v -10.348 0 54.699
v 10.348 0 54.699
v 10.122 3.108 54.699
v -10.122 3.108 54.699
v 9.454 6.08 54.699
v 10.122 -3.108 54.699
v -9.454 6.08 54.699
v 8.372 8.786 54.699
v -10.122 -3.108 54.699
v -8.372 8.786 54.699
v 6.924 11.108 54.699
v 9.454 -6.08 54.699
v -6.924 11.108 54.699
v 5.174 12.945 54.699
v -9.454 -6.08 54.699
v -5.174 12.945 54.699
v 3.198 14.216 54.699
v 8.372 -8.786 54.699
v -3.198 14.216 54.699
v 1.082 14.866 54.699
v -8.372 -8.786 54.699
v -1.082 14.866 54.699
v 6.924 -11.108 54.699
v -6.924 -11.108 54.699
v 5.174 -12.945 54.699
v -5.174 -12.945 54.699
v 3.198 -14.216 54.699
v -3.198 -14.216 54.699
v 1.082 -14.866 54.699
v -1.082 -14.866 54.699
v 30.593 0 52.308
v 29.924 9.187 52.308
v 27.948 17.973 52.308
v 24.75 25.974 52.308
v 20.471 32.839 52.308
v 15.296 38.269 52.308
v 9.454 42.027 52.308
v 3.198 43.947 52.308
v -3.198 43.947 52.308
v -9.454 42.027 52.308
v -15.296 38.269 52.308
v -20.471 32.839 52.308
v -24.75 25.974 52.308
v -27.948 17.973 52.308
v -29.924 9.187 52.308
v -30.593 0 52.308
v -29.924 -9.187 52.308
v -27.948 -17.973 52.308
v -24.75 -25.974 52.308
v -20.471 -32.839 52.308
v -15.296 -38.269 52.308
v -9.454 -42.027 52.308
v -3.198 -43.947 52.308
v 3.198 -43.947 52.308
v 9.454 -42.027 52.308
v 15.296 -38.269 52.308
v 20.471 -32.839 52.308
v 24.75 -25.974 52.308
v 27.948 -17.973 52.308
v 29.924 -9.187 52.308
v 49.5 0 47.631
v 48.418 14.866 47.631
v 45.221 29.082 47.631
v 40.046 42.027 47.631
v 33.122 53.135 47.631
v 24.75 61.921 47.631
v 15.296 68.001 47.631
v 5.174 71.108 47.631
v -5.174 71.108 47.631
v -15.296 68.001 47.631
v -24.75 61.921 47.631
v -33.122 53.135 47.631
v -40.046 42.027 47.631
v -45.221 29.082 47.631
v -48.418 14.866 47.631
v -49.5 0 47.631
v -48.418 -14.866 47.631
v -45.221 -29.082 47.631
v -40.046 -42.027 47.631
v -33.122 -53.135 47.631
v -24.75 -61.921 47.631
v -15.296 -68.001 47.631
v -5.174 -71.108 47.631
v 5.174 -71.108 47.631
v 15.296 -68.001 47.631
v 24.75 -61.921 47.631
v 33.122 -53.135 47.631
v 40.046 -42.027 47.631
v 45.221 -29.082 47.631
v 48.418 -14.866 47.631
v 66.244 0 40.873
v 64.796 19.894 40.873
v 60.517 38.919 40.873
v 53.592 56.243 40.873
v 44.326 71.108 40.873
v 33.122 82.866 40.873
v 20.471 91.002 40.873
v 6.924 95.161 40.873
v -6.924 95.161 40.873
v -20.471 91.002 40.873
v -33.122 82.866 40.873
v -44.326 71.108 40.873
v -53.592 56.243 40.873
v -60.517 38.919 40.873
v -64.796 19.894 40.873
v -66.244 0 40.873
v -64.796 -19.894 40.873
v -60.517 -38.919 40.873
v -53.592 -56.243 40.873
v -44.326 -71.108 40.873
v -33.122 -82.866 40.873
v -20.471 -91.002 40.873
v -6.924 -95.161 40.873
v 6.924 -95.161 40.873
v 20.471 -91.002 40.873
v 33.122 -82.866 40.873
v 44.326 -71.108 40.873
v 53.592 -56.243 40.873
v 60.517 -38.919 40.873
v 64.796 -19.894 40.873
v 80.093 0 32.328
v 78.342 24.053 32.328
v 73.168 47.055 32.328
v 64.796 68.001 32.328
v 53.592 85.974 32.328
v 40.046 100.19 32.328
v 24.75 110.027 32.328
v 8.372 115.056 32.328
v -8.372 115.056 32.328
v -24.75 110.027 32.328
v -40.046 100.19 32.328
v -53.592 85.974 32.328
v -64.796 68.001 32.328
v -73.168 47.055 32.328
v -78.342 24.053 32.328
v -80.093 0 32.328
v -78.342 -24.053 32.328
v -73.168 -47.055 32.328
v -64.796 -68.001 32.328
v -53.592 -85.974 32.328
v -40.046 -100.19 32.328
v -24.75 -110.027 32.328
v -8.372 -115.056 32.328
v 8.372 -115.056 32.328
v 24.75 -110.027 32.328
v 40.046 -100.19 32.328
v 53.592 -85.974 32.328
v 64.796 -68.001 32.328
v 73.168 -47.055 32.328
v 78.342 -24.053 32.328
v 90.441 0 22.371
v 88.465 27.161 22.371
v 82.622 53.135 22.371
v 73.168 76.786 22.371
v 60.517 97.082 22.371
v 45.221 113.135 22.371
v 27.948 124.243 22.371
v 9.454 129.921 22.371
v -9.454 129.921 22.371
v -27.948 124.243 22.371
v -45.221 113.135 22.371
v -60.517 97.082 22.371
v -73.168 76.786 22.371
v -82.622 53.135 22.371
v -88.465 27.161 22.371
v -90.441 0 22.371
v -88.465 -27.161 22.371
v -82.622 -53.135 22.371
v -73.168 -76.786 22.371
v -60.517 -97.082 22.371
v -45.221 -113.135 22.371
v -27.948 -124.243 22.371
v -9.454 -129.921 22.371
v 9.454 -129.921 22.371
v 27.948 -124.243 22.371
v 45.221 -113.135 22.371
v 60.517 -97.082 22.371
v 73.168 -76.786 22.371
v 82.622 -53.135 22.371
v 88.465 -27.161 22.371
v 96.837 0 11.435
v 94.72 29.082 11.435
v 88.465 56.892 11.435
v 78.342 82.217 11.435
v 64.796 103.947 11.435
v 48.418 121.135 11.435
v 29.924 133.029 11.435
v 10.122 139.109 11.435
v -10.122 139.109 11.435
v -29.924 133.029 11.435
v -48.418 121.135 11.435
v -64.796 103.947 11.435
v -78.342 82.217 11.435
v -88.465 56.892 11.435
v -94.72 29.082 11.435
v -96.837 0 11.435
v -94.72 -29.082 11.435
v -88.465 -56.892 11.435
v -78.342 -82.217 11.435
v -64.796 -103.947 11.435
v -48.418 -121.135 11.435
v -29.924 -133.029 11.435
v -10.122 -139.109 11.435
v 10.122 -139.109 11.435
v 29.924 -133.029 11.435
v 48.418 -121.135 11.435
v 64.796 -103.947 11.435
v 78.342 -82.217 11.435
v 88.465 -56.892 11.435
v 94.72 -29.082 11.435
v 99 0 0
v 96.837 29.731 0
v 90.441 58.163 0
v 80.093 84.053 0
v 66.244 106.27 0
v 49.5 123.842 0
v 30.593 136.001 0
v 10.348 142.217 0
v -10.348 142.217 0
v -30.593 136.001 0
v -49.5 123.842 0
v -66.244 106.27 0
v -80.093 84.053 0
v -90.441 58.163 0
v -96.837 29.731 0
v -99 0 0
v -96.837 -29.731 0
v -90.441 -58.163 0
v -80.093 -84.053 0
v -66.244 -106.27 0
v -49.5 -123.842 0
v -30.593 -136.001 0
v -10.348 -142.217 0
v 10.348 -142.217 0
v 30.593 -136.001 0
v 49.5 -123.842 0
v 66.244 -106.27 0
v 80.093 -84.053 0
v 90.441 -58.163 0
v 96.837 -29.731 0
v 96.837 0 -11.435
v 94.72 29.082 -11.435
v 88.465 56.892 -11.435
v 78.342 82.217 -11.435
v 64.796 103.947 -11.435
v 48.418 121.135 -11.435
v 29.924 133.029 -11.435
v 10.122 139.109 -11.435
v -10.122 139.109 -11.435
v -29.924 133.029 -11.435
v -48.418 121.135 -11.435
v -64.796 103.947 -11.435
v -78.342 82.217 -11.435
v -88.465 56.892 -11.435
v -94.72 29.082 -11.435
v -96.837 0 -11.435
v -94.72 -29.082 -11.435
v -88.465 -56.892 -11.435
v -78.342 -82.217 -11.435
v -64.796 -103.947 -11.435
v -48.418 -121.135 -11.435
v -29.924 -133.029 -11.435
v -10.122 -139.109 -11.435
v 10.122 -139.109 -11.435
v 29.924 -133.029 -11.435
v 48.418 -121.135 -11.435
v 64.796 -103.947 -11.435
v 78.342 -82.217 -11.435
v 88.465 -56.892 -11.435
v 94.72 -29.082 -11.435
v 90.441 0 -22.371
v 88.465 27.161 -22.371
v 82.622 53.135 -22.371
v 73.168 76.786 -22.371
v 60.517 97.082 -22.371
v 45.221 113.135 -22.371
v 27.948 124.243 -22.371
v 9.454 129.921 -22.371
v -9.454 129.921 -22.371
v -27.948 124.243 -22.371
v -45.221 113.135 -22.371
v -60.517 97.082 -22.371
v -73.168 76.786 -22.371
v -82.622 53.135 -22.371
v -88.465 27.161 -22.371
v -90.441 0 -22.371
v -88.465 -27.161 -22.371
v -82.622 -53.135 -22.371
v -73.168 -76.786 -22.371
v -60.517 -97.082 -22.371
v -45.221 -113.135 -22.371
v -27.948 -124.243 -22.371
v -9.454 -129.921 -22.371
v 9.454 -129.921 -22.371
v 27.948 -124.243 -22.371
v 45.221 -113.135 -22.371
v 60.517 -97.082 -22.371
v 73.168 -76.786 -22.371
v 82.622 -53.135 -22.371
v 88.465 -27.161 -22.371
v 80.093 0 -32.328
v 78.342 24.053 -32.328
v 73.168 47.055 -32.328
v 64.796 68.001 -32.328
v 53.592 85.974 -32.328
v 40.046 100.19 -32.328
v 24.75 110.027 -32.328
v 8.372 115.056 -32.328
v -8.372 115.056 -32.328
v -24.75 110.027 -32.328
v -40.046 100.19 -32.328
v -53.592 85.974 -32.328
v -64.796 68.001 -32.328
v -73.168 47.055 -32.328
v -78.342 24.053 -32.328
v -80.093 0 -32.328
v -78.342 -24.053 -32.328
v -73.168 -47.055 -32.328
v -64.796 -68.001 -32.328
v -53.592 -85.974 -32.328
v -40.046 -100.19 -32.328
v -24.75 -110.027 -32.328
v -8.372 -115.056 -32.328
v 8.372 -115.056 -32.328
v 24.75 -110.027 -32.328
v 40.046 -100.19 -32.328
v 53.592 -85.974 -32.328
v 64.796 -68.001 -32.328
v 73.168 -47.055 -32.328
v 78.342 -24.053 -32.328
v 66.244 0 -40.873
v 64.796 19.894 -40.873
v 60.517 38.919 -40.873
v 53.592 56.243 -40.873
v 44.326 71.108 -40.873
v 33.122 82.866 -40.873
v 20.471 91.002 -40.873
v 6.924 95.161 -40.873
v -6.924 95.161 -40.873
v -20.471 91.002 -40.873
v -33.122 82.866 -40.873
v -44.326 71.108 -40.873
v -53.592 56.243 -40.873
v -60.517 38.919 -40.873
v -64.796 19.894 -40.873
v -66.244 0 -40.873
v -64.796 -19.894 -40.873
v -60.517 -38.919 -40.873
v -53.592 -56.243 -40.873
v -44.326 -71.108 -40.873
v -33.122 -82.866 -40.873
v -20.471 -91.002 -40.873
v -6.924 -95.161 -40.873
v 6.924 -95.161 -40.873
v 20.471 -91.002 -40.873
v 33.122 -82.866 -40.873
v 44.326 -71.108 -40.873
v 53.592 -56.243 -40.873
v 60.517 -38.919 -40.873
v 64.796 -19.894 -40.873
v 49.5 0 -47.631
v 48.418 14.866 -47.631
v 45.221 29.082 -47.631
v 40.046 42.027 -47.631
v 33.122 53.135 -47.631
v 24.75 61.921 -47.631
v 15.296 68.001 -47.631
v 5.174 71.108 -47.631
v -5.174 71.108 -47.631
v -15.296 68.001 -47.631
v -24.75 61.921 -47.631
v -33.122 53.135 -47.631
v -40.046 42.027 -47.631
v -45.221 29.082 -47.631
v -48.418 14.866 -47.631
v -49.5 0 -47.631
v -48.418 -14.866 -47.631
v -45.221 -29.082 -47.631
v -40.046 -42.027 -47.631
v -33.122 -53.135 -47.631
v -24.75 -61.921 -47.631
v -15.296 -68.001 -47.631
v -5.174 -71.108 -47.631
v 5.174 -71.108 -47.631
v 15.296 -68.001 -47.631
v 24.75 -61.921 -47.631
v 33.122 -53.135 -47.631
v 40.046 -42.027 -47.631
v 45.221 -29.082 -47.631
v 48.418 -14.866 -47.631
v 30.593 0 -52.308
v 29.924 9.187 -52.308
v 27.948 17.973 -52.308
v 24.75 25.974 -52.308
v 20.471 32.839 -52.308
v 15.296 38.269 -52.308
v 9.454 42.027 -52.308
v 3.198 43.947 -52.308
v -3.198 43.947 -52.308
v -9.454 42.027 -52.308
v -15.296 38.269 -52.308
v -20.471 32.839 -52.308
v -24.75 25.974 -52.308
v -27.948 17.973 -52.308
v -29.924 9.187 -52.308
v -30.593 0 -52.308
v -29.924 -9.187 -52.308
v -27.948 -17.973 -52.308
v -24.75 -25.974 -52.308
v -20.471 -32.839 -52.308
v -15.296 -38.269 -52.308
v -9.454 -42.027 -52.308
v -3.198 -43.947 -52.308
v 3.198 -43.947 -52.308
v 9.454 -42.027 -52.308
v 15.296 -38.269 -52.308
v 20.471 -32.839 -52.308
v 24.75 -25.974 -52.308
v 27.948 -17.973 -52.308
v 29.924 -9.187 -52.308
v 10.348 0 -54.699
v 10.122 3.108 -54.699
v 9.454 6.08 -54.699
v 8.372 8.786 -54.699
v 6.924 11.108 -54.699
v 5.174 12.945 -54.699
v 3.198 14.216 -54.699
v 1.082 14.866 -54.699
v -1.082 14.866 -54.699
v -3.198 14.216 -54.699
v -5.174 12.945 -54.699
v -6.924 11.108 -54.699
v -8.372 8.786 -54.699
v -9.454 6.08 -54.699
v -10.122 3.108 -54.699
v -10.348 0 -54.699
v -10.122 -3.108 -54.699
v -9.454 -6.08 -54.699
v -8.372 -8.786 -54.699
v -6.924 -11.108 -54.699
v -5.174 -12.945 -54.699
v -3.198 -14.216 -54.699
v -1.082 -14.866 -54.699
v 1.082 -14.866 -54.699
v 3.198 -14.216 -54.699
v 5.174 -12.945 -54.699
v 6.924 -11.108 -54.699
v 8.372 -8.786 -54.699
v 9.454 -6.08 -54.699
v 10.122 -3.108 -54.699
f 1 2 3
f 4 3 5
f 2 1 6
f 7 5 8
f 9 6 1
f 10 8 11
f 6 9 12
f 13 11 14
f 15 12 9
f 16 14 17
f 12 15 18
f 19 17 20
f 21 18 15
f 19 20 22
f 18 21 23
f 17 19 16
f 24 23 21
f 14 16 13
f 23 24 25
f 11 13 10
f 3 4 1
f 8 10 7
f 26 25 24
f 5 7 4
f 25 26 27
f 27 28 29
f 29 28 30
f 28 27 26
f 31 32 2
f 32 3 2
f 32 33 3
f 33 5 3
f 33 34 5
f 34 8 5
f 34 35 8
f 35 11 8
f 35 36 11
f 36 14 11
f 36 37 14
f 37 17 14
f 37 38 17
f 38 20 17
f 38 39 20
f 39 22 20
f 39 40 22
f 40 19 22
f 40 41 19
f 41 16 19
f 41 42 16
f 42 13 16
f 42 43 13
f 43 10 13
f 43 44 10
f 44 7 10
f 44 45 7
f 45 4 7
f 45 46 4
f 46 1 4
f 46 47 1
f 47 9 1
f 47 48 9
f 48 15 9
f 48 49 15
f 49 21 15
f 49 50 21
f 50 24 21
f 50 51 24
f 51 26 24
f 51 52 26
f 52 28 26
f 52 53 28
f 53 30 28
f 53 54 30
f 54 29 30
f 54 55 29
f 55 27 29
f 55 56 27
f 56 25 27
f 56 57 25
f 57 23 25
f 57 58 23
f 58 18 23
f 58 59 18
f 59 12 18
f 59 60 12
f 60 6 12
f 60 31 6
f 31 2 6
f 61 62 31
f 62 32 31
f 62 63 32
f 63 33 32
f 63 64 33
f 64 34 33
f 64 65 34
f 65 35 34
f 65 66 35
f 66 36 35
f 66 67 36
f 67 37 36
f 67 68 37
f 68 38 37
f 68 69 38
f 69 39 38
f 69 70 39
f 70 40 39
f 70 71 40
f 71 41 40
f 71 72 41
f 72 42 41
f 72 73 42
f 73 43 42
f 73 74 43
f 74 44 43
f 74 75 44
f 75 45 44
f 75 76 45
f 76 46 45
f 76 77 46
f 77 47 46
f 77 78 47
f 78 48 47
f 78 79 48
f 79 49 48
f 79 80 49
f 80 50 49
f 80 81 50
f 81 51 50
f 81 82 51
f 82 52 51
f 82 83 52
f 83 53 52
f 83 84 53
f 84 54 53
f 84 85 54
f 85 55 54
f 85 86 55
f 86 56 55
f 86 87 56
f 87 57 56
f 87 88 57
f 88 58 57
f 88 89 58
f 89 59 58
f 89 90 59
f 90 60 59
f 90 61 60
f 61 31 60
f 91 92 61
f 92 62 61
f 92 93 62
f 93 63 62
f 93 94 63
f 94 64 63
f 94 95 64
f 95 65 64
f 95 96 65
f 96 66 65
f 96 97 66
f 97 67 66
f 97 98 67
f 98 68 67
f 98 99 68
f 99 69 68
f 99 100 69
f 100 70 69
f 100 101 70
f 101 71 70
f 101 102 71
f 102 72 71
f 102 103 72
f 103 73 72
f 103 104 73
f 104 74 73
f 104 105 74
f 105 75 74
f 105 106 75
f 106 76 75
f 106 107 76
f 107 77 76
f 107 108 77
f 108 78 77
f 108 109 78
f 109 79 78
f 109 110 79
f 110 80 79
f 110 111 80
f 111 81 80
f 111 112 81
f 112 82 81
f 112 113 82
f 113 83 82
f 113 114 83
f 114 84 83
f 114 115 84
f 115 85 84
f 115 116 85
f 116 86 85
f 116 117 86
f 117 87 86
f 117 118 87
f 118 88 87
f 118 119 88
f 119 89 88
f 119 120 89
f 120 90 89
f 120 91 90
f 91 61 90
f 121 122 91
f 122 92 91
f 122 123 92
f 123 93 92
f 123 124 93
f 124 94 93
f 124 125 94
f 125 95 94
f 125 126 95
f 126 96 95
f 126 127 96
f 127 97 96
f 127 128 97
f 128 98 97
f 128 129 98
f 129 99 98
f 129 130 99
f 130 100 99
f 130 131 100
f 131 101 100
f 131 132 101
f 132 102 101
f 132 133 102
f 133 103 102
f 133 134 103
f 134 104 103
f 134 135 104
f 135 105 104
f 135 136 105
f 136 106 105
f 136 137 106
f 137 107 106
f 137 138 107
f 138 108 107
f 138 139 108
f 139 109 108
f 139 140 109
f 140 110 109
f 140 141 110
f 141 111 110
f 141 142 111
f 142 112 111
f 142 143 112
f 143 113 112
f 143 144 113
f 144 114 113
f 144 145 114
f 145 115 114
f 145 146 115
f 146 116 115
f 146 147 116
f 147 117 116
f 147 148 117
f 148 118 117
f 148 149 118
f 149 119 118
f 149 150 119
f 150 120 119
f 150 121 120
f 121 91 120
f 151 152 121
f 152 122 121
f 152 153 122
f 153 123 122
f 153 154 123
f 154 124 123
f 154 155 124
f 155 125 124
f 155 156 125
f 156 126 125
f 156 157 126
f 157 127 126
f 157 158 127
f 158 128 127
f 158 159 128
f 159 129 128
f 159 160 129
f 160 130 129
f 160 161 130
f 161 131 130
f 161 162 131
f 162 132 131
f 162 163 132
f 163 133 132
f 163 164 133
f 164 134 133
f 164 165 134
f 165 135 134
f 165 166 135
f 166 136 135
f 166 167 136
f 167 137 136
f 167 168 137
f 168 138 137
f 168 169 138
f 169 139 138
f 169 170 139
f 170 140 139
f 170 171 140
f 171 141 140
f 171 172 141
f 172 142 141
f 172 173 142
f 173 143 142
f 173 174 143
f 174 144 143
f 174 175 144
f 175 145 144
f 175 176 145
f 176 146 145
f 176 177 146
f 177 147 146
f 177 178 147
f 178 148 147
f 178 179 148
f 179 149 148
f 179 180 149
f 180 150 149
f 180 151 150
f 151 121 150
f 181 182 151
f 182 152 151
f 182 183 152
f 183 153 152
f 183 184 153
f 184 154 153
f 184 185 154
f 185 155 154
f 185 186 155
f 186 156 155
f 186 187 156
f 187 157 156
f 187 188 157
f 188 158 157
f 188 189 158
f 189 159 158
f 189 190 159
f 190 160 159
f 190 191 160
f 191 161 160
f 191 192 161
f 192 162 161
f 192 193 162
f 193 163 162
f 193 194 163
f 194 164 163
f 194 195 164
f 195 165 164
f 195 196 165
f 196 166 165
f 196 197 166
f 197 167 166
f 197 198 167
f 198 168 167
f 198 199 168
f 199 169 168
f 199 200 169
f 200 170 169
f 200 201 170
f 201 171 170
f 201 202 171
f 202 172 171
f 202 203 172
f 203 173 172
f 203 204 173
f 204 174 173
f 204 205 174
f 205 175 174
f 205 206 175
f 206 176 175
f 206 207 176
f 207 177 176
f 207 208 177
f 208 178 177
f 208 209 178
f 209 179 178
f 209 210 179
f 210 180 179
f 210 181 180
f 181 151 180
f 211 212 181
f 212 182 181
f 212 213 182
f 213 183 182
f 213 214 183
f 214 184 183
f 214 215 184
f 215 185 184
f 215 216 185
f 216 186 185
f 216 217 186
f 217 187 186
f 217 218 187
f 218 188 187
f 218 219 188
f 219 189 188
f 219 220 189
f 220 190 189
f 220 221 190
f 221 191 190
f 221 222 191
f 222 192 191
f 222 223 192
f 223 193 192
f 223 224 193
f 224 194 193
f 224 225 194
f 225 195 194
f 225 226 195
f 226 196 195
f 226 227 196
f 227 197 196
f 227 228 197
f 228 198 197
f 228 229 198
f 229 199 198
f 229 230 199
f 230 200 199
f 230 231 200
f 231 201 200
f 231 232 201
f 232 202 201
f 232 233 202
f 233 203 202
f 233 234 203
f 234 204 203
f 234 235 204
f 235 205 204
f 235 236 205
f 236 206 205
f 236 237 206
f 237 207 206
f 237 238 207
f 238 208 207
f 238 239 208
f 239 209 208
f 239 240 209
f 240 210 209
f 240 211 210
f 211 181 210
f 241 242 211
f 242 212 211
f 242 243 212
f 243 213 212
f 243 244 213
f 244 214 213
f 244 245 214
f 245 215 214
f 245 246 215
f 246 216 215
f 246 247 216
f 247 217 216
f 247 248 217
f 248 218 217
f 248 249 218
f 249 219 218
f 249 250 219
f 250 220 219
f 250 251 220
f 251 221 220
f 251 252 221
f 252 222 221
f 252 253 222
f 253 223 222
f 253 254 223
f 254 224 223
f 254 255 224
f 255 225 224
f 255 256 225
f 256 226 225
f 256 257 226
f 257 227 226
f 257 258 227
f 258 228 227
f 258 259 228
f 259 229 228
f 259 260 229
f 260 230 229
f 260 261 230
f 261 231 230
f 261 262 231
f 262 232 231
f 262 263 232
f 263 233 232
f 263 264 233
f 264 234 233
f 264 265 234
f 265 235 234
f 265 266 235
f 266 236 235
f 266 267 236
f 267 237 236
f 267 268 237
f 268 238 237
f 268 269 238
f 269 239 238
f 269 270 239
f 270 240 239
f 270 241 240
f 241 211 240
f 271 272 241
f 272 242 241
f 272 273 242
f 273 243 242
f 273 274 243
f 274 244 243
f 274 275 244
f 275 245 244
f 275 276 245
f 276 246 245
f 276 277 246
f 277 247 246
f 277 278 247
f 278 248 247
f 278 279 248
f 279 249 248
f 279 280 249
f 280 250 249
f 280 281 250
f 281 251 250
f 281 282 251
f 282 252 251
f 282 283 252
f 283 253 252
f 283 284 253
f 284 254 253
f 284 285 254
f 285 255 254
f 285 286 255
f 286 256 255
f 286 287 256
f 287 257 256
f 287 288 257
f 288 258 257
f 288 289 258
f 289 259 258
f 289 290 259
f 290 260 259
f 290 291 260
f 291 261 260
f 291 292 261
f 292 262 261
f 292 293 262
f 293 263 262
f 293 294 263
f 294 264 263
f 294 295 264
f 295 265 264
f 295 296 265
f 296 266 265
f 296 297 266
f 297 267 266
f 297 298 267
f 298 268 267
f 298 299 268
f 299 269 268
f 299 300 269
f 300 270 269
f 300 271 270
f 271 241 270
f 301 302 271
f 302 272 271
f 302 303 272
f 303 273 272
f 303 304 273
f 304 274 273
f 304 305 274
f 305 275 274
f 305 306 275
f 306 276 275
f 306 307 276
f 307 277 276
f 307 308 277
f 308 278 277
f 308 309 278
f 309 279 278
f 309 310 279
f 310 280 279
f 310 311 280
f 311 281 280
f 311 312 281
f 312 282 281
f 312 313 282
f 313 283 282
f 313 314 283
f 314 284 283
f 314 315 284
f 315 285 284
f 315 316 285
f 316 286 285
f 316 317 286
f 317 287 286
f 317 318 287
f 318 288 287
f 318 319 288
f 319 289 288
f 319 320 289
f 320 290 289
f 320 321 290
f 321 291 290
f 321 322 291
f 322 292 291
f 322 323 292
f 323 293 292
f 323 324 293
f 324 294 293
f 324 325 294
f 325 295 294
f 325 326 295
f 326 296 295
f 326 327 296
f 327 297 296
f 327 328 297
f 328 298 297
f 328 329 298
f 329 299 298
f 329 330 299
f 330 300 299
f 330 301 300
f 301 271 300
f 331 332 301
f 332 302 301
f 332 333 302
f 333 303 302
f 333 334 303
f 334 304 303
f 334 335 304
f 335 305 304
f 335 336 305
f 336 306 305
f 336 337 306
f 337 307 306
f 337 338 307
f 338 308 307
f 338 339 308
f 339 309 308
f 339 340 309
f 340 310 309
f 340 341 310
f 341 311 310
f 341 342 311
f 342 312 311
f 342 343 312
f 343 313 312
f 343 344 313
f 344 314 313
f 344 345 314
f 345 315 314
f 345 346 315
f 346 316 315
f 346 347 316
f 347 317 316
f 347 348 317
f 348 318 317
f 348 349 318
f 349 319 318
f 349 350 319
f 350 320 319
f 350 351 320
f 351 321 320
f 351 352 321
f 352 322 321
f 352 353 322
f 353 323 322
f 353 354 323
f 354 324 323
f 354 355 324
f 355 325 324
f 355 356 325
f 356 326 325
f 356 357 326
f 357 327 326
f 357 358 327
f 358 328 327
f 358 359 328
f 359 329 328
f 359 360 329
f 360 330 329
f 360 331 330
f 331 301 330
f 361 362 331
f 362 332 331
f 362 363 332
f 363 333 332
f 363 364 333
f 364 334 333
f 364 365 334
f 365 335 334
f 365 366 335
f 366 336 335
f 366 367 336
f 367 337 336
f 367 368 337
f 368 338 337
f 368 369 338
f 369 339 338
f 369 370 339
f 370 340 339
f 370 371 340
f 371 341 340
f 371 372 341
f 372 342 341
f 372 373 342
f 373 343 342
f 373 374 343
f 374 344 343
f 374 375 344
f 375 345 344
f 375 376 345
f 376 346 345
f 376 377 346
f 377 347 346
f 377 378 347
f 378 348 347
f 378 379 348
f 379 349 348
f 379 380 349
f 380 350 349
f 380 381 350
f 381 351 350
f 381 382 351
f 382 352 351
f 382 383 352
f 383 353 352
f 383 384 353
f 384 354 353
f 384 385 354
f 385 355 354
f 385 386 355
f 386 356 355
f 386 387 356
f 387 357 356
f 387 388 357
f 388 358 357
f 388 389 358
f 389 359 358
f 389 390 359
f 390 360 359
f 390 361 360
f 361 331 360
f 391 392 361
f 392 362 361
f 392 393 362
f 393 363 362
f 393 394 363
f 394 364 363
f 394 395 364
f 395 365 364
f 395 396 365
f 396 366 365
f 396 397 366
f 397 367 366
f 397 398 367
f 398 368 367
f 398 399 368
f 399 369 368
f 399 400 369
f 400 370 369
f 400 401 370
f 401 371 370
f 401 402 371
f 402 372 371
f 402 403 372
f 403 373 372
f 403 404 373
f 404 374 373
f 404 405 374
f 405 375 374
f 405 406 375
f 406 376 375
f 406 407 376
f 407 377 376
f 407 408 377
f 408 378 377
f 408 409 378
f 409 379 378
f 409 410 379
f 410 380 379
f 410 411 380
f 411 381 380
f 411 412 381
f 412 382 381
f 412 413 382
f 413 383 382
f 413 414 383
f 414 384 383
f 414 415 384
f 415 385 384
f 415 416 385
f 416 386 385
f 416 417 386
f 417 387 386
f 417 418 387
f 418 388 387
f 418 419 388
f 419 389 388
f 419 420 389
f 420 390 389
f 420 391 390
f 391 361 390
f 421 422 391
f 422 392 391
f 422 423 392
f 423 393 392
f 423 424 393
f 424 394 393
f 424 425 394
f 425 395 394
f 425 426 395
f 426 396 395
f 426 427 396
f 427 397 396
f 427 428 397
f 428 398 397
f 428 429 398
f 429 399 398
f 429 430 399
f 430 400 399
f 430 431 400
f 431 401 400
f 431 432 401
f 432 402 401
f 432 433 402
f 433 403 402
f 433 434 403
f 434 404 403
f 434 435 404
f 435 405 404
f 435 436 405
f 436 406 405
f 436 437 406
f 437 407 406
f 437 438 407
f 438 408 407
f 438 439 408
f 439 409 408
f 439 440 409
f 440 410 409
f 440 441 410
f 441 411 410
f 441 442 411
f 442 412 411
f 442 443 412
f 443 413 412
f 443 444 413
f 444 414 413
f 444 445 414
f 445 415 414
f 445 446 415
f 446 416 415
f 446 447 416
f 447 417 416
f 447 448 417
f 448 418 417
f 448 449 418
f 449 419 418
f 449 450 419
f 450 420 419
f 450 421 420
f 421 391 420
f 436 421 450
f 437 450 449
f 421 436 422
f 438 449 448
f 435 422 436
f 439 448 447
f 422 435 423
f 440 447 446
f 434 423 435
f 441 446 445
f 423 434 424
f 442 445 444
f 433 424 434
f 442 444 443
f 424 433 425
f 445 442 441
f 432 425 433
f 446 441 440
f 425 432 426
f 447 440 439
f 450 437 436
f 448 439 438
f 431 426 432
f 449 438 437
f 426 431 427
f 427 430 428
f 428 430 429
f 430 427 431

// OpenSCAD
// Generated by SolidPython 1.0.1 on 2020-07-29 00:46:48


scale(v = [9, 13, 5]) {
	sphere(r = 11);
}
/***********************************************
*********      SolidPython code:      **********
************************************************
 
# import packages: SolidPython
from solid import *
from solid.utils import *
from itertools import chain, combinations, permutations


class Resize:

    def __init__(self, scad_file):
        self.scad_file = scad_file
        #self.scad_file = import_scad(scad_file)
        # cone/cylinder param:
        self.r1 = 0
        self.r2 = 0
        self.h = 0
        # rectangular prism param:
        self.w = 0
        self.l = 0
        # ellipse param:
        self.r = 0

    # import OpenScad code (file name corresponds to shape)


    # classify shape + parameters
    def assign(self, param1, param2, param3):
        if self.scad_file == 'cone.scad':
            self.r1 = param1
            self.r2 = param2
            self.h = param3
        elif self.scad_file == 'cylinder.scad':
            self.r1 = param1
            self.r2 = param2
            self.h = param3
        elif self.scad_file == 'rectangularPrism.scad':
            self.h = param1
            self.l = param2
            self.w = param3
        else:
            self.r = param1
            self.h = param2

    # resize parameters
    def iterate(self):
        x = range(3, 20, 2)
        i = 1
        if self.scad_file == 'cone.scad':
            tempList = list(permutations(x, 2))
            for temp in tempList:
                param1 = temp[0]
                param2 = temp[1]
                filepath = 'produced_scad_files/' + 'cone' + str(param1) + '_' + str(param2) + '_' + '.scad'
                scad_render_to_file(cylinder(h=param1, r1=param2, r2=0), filepath)

        elif self.scad_file == 'cylinder.scad':
            tempList = list(permutations(x, 3))
            for temp in tempList:
                param1 = temp[0]
                param2 = temp[1]
                filepath = 'produced_scad_files/' + 'cylinder' + str(param1) + '_' + str(param2) + '_' + '.scad'
                scad_render_to_file(cylinder(h=param1, r1=param2, r2=param2), filepath)

        elif self.scad_file == 'rectangularPrism.scad':
            tempList = list(permutations(x, 3))
            for temp in tempList:
                param1 = temp[0]
                param2 = temp[1]
                param3 = temp[2]
                filepath = 'produced_scad_files/' + 'rectangularPrism' + str(param1) + '_' + str(param2) + '_' + str(
                    param3) + '.scad'
                scad_render_to_file(cube(size=(param1, param2, param3)), filepath)

        elif self.scad_file == 'ellipse.scad':
            tempList = list(permutations(x, 4))
            for temp in tempList:
                param1 = temp[0]
                param2 = temp[1]
                param3 = temp[2]
                param4 = temp[3]
                filepath = 'produced_scad_files/' + 'ellipse' + str(param1) + '_' + str(param2) + '_' + str(param3) + '_' + str(param4) + '.scad'
                scad_render_to_file(scale([param1, param2, param3])(sphere(r=param4)), filepath)

    def render_to_scadfile(self):
        scad_render_to_file(scad, 'example.scad') 
 
************************************************/
